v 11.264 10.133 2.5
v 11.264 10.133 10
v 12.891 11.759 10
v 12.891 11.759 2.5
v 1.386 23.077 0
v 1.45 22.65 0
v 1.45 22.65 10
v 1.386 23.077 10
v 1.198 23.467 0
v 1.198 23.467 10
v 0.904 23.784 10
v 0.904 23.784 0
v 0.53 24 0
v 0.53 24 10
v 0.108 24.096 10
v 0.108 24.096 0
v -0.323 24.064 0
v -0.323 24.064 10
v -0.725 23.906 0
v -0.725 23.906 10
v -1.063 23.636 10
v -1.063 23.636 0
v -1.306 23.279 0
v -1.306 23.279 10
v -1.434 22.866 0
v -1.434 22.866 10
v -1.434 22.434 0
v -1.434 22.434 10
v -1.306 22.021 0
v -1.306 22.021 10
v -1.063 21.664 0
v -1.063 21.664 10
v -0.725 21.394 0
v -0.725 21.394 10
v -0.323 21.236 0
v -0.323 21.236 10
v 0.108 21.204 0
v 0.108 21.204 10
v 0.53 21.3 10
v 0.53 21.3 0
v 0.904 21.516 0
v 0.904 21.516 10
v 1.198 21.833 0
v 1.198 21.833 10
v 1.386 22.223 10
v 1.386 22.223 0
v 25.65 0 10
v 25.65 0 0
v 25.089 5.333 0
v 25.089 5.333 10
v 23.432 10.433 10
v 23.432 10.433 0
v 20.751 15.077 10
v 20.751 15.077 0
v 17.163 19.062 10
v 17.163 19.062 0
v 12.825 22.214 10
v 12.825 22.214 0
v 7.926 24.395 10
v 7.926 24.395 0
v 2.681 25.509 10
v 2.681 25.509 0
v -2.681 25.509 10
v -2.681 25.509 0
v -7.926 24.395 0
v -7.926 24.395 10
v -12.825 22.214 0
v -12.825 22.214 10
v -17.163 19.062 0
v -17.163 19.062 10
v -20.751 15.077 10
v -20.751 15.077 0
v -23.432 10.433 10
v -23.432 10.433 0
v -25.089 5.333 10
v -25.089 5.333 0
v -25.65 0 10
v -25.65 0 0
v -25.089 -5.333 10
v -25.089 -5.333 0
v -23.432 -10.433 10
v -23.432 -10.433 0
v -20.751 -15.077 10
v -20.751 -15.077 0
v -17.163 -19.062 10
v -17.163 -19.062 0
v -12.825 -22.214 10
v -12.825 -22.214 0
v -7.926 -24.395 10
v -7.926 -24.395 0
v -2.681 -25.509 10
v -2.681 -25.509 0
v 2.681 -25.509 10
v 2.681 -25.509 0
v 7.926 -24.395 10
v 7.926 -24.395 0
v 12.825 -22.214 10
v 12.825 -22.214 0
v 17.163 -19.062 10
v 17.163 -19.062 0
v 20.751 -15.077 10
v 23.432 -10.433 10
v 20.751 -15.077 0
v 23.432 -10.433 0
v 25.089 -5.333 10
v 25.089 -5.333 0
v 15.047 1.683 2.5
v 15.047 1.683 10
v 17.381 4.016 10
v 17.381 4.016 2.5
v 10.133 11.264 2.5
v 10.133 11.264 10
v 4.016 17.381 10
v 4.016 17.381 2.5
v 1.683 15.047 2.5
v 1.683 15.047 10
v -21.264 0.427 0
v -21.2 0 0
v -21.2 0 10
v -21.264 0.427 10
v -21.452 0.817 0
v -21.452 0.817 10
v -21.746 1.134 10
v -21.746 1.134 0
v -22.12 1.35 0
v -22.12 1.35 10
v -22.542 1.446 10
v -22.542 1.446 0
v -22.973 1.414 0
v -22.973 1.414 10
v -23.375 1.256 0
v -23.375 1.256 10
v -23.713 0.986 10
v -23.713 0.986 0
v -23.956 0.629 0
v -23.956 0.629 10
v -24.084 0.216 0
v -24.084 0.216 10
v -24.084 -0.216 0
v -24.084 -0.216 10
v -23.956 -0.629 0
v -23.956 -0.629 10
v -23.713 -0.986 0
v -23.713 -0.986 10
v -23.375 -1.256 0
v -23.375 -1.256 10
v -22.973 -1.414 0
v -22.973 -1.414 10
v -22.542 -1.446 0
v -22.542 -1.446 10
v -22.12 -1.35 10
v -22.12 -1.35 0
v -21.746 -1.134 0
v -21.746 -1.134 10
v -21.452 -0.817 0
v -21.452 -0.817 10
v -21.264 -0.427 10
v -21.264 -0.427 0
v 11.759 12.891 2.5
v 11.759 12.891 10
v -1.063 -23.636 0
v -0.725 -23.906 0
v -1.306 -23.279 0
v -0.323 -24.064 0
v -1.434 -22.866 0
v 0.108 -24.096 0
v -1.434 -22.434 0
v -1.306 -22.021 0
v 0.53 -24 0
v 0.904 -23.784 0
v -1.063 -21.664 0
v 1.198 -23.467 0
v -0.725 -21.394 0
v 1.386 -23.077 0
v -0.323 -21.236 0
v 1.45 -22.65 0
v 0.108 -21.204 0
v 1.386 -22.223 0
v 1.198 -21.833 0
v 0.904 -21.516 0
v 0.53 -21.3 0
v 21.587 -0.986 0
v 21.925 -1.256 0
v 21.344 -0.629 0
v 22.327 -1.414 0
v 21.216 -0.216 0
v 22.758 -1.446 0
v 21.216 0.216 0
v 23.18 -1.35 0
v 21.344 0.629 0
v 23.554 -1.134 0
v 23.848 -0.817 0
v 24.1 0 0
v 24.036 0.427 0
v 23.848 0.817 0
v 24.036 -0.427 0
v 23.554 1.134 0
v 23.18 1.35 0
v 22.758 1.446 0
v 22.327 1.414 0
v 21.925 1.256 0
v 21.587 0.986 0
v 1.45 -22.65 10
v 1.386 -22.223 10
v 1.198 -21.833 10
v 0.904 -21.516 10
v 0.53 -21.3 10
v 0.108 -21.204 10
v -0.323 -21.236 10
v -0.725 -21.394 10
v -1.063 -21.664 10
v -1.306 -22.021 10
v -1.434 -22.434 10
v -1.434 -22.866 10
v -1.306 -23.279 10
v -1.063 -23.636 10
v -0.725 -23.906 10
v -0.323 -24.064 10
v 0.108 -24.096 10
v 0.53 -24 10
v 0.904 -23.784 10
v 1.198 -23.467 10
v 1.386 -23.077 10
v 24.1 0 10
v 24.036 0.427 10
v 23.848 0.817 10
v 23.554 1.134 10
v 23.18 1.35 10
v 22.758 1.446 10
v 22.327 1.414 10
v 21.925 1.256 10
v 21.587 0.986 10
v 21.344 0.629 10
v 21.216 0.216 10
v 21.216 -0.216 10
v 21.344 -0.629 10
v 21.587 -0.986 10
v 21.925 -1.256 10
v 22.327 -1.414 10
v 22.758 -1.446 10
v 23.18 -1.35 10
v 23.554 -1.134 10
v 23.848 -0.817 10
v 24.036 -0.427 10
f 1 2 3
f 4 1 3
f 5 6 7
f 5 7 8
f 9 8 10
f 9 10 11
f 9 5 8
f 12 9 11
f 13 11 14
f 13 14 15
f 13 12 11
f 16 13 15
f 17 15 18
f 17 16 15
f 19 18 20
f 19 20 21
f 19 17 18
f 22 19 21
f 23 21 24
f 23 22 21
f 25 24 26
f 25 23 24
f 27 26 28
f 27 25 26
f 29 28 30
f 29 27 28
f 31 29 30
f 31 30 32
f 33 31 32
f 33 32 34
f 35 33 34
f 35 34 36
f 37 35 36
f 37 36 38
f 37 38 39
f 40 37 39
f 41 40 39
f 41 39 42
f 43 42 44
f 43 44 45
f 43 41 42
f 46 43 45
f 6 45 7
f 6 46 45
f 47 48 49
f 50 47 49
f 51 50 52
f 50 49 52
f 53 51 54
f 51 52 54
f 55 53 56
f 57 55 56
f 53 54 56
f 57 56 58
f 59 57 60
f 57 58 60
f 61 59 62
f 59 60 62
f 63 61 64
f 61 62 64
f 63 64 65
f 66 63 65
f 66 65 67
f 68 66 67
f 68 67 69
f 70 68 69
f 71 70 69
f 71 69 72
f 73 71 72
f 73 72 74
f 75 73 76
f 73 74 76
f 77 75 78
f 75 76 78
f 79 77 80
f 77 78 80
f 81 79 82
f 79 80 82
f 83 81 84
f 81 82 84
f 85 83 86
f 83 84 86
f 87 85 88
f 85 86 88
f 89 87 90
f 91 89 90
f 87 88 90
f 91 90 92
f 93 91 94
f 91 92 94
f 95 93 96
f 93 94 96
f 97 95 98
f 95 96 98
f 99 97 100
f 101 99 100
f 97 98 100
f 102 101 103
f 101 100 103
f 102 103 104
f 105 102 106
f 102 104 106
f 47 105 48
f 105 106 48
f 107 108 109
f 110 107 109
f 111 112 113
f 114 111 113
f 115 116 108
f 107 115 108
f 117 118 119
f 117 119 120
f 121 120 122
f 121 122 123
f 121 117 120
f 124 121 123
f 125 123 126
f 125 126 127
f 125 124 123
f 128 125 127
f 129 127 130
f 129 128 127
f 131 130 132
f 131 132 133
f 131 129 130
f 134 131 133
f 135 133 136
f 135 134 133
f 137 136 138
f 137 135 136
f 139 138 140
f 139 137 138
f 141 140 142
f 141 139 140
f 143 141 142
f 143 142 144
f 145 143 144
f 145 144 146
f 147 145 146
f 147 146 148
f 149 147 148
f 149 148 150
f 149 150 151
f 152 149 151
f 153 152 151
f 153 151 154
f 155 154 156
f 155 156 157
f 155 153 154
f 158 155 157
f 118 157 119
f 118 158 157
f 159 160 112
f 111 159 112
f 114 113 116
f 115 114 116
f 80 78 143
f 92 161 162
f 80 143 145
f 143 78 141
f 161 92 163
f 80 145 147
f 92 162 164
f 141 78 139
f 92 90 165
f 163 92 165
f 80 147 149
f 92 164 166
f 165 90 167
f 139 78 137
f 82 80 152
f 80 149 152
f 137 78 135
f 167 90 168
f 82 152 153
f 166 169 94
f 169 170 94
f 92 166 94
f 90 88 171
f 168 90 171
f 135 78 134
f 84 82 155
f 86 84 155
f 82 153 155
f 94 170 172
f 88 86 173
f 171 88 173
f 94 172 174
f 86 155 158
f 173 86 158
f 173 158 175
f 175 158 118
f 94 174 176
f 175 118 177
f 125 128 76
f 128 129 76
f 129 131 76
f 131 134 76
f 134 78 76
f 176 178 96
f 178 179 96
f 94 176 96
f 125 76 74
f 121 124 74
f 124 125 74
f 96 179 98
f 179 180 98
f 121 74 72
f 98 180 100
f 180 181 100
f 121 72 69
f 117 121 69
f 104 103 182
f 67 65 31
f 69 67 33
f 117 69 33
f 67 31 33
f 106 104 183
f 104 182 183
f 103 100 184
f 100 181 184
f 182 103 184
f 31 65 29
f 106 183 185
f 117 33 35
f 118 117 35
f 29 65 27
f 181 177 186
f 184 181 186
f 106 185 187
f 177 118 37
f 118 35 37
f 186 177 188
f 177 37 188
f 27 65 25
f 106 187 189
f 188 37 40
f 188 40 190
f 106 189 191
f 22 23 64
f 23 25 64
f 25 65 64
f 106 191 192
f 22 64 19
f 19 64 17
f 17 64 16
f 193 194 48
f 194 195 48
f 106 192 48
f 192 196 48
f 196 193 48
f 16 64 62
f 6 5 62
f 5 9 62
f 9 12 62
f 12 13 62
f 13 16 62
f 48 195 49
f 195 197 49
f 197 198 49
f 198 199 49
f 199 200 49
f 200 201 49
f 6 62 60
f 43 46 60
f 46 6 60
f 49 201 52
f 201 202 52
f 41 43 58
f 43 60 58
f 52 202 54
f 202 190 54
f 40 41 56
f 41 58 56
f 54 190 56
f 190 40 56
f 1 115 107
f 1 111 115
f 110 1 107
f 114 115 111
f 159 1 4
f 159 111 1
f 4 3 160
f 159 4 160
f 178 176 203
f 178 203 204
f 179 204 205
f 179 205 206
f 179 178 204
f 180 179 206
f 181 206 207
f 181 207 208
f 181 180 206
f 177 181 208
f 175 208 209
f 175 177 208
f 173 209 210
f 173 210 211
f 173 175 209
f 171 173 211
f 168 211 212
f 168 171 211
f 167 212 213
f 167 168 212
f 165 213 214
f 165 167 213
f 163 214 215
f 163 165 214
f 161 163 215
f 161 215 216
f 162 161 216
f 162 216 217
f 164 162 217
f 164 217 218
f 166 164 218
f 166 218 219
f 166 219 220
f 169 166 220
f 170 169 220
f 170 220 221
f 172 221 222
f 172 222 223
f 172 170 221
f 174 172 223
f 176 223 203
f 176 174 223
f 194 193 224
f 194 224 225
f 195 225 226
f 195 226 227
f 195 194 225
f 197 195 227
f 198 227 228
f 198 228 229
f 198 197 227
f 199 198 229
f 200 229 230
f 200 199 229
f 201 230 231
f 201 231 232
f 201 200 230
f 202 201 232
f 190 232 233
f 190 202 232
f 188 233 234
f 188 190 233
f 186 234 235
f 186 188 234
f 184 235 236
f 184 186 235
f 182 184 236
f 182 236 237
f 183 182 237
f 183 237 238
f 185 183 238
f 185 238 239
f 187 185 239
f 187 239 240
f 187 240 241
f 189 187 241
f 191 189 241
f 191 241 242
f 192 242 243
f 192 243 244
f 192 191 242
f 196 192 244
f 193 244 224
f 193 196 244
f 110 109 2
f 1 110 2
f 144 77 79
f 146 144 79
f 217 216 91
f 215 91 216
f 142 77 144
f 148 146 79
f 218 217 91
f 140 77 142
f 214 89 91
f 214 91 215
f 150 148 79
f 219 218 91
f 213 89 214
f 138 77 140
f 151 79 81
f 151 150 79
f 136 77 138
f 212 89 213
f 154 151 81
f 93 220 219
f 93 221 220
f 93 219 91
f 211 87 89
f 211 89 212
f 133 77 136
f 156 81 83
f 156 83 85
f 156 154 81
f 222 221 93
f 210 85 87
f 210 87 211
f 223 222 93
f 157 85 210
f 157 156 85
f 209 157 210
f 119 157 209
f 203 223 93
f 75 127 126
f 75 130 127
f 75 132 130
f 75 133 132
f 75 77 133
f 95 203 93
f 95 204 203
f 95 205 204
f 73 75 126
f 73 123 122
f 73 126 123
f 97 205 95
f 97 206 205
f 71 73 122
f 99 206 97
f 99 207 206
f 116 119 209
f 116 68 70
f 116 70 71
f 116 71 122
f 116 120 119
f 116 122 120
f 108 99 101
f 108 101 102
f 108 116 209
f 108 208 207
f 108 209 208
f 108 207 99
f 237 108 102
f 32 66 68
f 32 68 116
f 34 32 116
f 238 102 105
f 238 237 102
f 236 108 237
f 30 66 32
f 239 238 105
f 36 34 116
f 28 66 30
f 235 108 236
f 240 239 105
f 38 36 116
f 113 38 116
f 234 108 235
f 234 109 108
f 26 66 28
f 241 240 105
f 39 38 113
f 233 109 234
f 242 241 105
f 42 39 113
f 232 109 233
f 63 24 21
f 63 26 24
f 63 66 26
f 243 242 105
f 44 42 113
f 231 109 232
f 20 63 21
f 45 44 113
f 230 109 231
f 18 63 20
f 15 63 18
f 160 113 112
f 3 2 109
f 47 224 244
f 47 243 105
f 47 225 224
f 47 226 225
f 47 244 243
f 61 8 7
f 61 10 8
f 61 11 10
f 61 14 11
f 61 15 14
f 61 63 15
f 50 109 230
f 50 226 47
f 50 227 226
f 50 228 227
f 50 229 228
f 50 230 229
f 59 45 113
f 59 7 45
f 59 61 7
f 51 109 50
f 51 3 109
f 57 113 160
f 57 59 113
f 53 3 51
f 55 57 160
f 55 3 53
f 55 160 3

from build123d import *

# Parameters (mm, degrees)
SKETCH1_R           = 25.65
SKETCH1_R_2         = 1.45
BOSS_EXTRUDE1_DEPTH = 10
CUT_EXTRUDE1_DEPTH  = 7.5


with BuildPart() as part:
    # Sketch1 → Boss-Extrude1 (new body)
    with BuildSketch(Plane.XY):
        Circle(SKETCH1_R)
        with Locations((0, -22.65)):
            Circle(SKETCH1_R_2, mode=Mode.SUBTRACT)
        with Locations((22.65, 0)):
            Circle(SKETCH1_R_2, mode=Mode.SUBTRACT)
        with Locations((0, 22.65)):
            Circle(SKETCH1_R_2, mode=Mode.SUBTRACT)
        with Locations((-22.65, 0)):
            Circle(SKETCH1_R_2, mode=Mode.SUBTRACT)
    extrude(amount=BOSS_EXTRUDE1_DEPTH)

    # Sketch2 → Cut-Extrude1 (cut)
    with BuildSketch(Plane.XY.offset(10)):
        Polygon((1.682914139, 15.047232304), (15.047232304, 1.682914139), (17.380684682, 4.016366517), (11.264211024, 10.132840174), (12.890556621, 11.759185771), (11.759185771, 12.890556621), (10.132840174, 11.264211024), (4.016366517, 17.380684682), align=None)
    extrude(amount=-CUT_EXTRUDE1_DEPTH, mode=Mode.SUBTRACT)


solid = part.part
